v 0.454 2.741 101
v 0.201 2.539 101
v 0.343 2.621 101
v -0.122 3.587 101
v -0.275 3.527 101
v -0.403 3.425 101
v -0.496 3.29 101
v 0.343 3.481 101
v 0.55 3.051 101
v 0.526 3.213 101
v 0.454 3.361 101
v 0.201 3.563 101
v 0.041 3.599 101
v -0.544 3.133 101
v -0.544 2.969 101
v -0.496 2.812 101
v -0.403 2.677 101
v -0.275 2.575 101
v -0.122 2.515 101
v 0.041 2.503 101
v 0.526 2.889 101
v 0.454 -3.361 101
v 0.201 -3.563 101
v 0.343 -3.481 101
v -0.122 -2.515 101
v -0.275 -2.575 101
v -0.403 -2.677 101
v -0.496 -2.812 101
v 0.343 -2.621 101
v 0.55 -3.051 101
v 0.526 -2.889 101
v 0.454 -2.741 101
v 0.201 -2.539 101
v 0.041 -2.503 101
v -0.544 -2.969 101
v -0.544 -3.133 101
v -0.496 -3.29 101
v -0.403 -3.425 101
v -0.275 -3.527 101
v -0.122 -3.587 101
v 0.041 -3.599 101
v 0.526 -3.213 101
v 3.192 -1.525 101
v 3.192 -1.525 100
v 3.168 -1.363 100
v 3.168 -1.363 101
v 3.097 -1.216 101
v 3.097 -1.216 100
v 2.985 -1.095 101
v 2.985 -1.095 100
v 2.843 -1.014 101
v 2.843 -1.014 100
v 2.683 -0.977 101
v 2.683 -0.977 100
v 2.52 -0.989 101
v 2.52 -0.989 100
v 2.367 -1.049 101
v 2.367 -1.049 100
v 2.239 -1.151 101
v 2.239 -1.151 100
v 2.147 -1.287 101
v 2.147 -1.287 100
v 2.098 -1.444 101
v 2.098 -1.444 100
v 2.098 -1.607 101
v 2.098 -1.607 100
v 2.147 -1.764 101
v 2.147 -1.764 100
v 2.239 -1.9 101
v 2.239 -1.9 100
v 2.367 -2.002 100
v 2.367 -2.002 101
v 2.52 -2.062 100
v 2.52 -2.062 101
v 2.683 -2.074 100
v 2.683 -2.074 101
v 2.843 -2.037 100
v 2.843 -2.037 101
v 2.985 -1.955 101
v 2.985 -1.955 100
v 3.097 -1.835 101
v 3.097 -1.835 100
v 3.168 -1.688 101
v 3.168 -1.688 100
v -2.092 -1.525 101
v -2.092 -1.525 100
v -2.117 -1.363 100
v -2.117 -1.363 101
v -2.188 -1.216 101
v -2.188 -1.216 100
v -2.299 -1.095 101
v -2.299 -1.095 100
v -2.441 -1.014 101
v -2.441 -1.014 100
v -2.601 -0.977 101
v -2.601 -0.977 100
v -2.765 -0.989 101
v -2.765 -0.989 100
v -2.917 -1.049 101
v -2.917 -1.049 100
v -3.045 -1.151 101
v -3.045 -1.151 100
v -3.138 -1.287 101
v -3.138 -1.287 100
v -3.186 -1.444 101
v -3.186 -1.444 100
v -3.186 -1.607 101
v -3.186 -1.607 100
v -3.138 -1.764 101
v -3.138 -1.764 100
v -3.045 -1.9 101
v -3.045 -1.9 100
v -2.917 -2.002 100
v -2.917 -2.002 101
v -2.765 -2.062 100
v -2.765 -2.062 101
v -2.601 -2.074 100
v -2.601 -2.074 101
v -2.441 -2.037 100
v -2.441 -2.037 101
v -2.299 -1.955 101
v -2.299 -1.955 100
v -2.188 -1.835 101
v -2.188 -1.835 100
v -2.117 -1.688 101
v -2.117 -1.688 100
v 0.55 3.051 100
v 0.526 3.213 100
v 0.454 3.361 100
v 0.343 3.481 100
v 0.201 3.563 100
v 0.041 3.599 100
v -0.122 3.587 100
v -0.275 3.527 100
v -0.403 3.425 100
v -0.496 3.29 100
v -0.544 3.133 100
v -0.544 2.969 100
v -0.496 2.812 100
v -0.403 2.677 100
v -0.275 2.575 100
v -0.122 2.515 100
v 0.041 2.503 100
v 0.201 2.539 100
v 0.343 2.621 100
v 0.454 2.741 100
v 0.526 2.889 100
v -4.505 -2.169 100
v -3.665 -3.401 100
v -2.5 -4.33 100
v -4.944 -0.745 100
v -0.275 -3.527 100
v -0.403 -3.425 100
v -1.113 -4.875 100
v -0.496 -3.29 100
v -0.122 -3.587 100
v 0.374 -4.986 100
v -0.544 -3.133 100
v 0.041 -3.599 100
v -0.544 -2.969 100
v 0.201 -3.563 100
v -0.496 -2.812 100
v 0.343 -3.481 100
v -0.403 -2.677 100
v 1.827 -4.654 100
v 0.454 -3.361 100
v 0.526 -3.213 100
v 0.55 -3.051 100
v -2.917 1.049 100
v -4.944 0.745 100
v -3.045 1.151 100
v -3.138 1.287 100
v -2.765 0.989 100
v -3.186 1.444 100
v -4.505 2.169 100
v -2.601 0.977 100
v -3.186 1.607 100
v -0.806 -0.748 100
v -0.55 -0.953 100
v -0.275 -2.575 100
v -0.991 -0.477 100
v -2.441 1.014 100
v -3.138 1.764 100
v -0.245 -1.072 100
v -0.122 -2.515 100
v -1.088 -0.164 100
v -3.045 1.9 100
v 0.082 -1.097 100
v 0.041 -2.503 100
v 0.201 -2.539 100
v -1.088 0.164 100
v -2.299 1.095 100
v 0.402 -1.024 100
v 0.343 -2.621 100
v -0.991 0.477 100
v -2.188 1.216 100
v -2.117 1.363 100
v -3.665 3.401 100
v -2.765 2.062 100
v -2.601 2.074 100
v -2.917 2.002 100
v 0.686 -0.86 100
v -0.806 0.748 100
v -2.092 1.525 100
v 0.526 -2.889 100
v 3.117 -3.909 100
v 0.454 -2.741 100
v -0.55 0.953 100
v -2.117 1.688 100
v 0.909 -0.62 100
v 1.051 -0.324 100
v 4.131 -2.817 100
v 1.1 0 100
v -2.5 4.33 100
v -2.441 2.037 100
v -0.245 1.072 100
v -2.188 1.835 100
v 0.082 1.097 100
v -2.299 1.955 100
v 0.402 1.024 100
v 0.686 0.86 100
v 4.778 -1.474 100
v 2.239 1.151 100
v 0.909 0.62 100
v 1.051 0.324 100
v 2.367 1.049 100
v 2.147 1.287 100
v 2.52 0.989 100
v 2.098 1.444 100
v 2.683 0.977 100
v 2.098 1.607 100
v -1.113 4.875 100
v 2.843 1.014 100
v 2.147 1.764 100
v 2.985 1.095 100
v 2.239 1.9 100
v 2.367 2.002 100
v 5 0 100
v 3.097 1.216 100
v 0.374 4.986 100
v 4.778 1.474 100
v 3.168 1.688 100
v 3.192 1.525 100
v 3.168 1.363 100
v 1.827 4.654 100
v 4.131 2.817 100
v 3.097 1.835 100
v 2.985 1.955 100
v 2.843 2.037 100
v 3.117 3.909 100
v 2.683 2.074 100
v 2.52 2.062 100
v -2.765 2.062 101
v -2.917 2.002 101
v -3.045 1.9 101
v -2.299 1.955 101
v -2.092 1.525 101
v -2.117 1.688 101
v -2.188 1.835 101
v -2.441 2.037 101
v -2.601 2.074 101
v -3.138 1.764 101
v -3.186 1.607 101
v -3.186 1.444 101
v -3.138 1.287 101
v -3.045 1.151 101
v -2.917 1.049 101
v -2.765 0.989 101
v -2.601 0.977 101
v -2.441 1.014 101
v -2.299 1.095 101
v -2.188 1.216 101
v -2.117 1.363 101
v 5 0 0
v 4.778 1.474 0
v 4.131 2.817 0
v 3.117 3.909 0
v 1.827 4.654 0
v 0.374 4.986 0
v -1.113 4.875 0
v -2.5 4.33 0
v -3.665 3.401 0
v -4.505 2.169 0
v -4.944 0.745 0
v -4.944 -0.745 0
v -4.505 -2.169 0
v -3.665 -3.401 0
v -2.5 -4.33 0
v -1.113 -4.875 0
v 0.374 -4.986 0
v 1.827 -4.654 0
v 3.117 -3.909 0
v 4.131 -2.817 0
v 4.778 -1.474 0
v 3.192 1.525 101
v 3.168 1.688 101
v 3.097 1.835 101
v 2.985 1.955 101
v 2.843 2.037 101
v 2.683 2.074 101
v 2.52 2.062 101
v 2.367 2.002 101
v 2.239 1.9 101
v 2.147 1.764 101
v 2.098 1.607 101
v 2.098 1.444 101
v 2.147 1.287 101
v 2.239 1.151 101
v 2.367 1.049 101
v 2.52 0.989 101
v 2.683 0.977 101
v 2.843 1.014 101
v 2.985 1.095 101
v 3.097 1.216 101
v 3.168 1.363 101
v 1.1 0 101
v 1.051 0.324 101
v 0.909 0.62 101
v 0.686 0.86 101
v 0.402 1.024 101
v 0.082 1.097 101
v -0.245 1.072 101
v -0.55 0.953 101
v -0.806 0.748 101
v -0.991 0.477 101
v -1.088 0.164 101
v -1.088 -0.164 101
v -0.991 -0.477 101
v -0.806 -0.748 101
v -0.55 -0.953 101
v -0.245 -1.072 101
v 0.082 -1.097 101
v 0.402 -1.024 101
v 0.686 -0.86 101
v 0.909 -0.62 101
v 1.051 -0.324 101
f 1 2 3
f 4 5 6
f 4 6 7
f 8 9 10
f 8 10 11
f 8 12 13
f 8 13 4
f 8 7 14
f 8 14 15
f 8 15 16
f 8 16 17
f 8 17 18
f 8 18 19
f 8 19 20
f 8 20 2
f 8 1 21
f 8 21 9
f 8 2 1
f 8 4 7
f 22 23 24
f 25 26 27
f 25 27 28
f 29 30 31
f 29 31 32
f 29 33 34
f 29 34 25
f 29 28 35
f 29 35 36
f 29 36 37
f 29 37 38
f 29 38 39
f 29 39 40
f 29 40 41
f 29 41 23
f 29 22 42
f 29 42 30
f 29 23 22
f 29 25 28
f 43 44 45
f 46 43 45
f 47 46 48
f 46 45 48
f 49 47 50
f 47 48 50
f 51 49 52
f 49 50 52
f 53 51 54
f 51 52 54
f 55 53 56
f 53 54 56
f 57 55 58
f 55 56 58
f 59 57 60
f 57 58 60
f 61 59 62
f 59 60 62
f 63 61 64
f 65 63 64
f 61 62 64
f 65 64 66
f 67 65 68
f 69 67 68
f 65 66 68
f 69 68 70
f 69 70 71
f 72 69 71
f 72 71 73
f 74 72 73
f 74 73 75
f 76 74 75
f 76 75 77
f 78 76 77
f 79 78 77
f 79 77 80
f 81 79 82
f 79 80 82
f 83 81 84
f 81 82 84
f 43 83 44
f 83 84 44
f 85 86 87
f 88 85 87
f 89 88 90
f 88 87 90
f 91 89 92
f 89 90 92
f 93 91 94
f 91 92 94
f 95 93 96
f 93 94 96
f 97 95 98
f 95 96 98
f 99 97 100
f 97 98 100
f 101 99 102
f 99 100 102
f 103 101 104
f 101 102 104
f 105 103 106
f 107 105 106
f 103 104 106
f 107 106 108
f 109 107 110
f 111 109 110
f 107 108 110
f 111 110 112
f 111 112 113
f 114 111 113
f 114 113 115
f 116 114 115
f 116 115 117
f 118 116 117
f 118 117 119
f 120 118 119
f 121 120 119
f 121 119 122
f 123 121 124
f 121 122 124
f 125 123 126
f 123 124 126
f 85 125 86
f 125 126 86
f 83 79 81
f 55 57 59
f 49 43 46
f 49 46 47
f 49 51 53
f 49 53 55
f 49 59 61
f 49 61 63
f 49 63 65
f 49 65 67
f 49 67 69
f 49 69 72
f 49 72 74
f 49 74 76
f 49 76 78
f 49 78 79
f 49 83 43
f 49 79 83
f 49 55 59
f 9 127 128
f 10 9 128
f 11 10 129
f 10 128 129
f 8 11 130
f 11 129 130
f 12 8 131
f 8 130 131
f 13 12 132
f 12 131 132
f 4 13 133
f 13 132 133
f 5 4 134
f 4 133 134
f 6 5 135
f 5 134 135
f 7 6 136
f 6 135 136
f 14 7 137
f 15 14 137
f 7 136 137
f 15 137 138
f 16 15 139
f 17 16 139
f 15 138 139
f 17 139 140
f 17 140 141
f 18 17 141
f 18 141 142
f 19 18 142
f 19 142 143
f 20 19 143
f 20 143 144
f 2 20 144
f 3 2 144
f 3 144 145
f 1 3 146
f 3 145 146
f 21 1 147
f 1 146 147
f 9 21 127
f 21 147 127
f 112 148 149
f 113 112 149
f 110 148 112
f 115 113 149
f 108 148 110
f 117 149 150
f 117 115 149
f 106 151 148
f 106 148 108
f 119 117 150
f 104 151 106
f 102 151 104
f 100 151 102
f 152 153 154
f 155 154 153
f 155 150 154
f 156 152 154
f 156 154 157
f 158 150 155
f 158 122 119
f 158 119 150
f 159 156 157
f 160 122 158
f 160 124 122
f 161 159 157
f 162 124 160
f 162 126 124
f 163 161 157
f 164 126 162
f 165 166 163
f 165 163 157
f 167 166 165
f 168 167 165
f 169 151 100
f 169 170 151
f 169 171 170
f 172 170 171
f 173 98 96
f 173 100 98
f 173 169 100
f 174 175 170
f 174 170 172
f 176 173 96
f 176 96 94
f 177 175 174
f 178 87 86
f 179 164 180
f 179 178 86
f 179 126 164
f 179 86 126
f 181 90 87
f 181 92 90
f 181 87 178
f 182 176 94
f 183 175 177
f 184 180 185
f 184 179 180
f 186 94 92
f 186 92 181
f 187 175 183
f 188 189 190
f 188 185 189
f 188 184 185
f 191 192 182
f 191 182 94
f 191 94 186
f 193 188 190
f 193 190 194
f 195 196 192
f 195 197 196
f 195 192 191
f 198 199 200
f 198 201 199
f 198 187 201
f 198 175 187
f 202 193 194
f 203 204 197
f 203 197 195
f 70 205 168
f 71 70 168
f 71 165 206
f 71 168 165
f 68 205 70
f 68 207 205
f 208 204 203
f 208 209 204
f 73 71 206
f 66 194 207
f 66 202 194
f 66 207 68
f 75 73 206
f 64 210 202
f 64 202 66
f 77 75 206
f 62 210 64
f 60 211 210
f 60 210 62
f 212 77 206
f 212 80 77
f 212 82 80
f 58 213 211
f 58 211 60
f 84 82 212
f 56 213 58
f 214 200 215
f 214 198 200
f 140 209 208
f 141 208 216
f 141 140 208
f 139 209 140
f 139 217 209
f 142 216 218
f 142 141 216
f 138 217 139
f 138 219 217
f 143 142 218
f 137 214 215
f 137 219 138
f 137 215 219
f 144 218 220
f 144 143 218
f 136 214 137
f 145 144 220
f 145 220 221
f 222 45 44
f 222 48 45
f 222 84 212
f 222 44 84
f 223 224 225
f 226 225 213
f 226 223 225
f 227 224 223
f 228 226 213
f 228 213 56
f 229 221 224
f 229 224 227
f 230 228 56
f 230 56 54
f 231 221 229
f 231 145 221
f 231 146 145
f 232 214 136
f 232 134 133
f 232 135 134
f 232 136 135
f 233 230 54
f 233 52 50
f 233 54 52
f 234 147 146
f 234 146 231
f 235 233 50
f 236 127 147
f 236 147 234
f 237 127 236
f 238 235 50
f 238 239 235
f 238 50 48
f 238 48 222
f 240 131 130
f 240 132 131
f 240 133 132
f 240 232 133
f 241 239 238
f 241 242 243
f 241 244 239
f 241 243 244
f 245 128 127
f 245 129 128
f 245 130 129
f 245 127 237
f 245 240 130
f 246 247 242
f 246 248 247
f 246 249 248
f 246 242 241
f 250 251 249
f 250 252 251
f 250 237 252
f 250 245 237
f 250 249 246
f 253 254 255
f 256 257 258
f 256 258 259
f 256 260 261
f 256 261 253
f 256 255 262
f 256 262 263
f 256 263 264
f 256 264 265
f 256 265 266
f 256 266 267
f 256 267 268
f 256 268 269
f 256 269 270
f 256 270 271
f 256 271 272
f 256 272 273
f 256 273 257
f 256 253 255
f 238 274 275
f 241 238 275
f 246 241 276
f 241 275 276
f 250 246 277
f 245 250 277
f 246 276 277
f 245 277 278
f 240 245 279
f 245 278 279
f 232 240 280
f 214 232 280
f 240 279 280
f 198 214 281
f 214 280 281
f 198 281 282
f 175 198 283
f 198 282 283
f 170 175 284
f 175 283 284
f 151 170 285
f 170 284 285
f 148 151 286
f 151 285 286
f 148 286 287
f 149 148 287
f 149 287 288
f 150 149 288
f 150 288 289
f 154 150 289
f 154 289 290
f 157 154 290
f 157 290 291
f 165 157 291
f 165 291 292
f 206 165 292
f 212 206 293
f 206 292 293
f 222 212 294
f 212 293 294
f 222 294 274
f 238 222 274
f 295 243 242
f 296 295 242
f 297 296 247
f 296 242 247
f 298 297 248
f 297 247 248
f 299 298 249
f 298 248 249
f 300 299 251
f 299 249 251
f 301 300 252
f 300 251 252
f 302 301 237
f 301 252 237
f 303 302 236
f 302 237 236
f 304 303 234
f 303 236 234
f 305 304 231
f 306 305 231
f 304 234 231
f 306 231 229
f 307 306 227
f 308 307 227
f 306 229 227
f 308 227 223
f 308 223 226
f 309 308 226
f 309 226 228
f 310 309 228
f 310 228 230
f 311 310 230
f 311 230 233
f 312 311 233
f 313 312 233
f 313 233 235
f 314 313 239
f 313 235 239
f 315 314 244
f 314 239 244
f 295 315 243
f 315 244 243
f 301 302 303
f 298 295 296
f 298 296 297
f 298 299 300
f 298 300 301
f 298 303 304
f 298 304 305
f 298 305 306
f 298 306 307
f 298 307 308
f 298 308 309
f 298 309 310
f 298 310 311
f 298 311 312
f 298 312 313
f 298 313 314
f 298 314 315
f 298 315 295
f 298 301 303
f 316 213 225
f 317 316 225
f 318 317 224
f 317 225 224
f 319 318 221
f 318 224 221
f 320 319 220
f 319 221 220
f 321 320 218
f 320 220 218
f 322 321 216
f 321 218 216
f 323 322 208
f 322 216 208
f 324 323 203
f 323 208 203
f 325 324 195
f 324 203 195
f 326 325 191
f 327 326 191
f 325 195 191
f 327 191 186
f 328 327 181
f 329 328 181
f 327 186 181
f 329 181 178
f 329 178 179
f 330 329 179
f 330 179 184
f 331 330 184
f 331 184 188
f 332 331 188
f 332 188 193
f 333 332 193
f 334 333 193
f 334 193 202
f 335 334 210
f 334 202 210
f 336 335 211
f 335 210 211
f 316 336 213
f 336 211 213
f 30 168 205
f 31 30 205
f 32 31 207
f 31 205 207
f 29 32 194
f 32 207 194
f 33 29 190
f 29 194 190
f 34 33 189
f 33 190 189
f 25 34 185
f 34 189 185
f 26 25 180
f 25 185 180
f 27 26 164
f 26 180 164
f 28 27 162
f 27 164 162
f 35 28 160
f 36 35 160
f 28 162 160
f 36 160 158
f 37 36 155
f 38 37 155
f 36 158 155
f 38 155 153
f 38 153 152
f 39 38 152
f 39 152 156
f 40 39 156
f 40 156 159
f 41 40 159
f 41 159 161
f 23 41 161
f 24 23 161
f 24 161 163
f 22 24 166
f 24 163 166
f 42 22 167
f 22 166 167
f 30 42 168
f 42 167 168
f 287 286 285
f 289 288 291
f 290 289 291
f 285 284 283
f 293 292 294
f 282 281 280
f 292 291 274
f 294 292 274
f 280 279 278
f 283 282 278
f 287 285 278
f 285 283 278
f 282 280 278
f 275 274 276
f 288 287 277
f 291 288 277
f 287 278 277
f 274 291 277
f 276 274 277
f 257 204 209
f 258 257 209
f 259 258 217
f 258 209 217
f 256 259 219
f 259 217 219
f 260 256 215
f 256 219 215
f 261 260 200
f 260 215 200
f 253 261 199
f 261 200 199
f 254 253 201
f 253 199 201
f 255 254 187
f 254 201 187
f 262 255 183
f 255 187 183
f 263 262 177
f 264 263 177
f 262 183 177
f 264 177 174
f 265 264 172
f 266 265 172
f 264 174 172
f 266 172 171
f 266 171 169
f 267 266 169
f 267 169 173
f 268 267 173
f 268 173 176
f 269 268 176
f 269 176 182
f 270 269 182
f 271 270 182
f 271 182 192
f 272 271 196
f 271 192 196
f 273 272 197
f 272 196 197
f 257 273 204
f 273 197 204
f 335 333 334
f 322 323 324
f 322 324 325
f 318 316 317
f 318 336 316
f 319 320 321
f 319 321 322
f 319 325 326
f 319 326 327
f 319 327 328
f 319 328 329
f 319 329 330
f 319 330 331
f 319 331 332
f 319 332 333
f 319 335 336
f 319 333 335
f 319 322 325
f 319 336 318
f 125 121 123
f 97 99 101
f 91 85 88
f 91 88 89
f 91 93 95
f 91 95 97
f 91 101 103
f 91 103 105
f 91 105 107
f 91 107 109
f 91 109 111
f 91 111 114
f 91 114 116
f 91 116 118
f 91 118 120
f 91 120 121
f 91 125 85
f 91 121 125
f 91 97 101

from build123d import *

# Parameters (mm, degrees)
SKETCH1_R           = 5
BOSS_EXTRUDE1_DEPTH = 100
SKETCH3_R           = 1.1
SKETCH3_R_2         = 0.55
BOSS_EXTRUDE3_DEPTH = 1


with BuildPart() as part:
    # Sketch1 → Boss-Extrude1 (new body)
    with BuildSketch(Plane.XY):
        Circle(SKETCH1_R)
    extrude(amount=BOSS_EXTRUDE1_DEPTH)

    # Sketch3 → Boss-Extrude3 (add)
    with BuildSketch(Plane.XY.offset(100)):
        Circle(SKETCH3_R)
        with Locations((-2.642220318, 1.525486612)):
            Circle(SKETCH3_R_2)
        with Locations((0, 3.050973223)):
            Circle(SKETCH3_R_2)
        with Locations((-2.642220318, -1.525486612)):
            Circle(SKETCH3_R_2)
        with Locations((0, -3.050973223)):
            Circle(SKETCH3_R_2)
        with Locations((2.642220318, -1.525486612)):
            Circle(SKETCH3_R_2)
        with Locations((2.642220318, 1.525486612)):
            Circle(SKETCH3_R_2)
    extrude(amount=BOSS_EXTRUDE3_DEPTH)


solid = part.part
